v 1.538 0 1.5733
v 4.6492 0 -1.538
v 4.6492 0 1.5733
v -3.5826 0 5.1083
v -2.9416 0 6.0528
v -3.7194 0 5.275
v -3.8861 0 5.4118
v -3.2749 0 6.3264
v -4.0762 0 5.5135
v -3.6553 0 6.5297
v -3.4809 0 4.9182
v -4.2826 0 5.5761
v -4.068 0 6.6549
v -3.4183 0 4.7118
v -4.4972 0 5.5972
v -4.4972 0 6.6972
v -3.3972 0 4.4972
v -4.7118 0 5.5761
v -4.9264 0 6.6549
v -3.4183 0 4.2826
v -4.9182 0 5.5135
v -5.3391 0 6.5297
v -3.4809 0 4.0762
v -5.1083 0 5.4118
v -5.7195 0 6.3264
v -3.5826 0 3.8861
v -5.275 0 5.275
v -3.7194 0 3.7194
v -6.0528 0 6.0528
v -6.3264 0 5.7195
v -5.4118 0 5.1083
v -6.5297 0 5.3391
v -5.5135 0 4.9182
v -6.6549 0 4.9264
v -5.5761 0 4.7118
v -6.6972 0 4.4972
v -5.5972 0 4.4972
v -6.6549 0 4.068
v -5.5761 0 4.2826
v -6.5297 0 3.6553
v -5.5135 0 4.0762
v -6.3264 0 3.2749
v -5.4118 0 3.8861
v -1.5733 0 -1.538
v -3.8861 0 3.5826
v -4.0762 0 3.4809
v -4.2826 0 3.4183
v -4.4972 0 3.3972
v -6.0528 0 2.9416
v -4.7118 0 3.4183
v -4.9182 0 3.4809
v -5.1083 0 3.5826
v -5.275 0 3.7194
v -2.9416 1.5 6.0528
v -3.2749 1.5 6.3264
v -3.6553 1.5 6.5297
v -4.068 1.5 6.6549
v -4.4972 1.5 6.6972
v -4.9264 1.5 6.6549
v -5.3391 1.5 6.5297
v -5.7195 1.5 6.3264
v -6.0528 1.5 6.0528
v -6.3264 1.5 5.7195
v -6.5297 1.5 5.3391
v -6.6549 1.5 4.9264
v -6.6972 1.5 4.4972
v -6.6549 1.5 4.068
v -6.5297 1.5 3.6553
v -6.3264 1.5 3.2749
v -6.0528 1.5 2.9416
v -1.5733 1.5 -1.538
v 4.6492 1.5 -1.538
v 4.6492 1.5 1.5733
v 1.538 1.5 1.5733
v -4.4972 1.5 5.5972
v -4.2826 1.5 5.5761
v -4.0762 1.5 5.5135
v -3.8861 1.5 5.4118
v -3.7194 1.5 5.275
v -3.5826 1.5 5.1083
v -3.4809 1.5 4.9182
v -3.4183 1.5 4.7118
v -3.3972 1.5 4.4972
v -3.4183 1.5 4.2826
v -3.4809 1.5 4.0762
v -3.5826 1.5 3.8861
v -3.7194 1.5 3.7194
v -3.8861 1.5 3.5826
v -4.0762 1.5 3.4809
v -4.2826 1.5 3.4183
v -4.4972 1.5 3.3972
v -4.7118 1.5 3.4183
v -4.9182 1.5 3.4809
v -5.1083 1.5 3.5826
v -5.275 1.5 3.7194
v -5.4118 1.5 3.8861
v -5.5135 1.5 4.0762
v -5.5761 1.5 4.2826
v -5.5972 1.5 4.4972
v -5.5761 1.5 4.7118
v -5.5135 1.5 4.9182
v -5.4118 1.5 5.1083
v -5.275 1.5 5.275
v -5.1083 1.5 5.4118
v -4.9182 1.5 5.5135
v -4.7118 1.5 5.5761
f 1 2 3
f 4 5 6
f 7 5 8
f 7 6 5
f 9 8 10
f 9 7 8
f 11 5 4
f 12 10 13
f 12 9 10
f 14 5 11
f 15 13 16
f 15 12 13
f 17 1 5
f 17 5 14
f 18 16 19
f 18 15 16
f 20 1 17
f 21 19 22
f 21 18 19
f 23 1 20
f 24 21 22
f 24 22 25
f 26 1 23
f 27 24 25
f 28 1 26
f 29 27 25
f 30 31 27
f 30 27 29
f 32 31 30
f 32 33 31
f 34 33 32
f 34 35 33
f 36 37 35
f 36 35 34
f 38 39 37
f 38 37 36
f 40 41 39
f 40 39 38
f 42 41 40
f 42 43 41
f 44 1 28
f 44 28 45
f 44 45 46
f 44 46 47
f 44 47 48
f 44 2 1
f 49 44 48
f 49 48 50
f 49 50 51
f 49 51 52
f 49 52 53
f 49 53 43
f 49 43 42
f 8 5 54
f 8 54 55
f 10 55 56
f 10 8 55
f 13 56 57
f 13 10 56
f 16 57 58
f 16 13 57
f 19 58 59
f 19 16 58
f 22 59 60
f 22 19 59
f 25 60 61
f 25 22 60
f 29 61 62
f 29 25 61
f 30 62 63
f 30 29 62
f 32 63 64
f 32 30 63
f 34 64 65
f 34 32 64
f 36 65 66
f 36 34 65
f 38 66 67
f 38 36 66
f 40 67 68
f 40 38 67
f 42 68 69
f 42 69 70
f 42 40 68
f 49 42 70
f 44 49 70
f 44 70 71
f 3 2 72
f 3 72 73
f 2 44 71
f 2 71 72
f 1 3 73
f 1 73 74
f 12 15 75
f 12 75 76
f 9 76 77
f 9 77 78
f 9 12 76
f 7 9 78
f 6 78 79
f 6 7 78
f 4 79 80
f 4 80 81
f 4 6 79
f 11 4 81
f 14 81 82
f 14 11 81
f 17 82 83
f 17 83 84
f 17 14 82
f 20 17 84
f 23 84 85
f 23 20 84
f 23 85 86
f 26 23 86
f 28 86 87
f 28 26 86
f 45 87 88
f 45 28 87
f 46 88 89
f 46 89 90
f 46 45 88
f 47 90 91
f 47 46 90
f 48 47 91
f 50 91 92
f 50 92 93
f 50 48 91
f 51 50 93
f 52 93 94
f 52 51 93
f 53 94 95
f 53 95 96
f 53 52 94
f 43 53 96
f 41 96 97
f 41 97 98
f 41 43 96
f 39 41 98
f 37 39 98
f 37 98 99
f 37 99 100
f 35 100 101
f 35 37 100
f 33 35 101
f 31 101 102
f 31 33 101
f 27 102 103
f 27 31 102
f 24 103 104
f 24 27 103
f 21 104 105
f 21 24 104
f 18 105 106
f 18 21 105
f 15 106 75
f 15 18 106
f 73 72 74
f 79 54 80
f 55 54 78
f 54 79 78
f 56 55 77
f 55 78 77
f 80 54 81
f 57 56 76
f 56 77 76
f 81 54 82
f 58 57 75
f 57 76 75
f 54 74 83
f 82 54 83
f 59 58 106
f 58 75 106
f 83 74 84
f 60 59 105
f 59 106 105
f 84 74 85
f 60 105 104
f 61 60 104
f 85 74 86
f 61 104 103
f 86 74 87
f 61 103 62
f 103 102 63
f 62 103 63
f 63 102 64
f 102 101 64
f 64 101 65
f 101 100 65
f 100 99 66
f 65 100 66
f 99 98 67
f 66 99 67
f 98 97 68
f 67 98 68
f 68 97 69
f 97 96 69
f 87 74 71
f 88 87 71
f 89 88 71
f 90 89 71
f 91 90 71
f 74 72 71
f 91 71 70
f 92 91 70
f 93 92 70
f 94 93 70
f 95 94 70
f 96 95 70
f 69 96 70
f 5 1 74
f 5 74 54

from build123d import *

# Parameters (mm, degrees)
SKETCH_2_R      = 1.1
EXTRUDE_1_DEPTH = 1.5


with BuildPart() as part:
    # 草图2 → 凸台-拉伸1 (new body)
    with BuildSketch(Plane(origin=(0, 0, 0), x_dir=(1, 0, 0), z_dir=(0, 1, 0))):
        with BuildLine():
            Line((1.537957249, 1.537957249), (4.649227086, 1.537957249))
            Line((4.649227086, 1.537957249), (4.649227086, -1.573312588))
            Line((4.649227086, -1.573312588), (1.537957249, -1.573312588))
            Line((1.537957249, -1.573312588), (-2.94156421, -6.052834047))
            ThreePointArc((-2.94156421, -6.052834047), (-6.052834047, -6.052834047), (-6.052834047, -2.94156421))
            Line((-6.052834047, -2.94156421), (-1.573312588, 1.537957249))
            Line((-1.573312588, 1.537957249), (1.537957249, 1.537957249))
        make_face()
        with Locations(Location((-4.497199128, -4.497199128, 0), (0, 0, 270))):
            Circle(SKETCH_2_R, mode=Mode.SUBTRACT)
    extrude(amount=EXTRUDE_1_DEPTH)


solid = part.part
